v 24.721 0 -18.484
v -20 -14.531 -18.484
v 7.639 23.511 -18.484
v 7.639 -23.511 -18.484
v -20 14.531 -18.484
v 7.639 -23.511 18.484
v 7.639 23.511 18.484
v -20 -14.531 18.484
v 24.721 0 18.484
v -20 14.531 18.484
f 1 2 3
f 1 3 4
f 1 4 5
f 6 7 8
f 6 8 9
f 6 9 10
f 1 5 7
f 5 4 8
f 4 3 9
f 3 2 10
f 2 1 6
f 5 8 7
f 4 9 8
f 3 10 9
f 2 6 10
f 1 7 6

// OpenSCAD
use <../../core/funcs.scad>
use <../../core/placement.scad>
use <../../core/duals.scad>
use <../../core/truncation.scad>
use <../../core/render.scad>
use <../../core/classify.scad>
use <../../core/prisms.scad>
use <../../core/construction.scad>

use <../../models/platonics_all.scad>
use <../../models/archimedians_all.scad>
use <../../models/johnsons_all.scad>

use <edge_seg.scad>
use <face_plate.scad>

SC = 1;
IR = 20 * SC;

//p = (tetrahedron());
//p = poly_truncate(dodecahedron());
//p = (dodecahedron());
//base = icosahedron();
//sol = solve_cantitruncate_trig(base);
//s = poly_cantellate_norm(base, 0.5);
//p = poly_dual(great_rhombicuboctahedron());
//p = poly_truncate(poly_dual(poly_truncate(hexahedron())), t=0, params_overrides=[["vert", "id", [0,1,2,3,4,55], ["t",0.5001]]]);
//p = poly_attach(octahedron(), icosahedron(), f1=[0,7]);
//p = poly_attach(octahedron(), icosahedron(), f1=[0,1,2,3,4,5,6,7]);
//p = poly_attach(p1, icosahedron(), f1=0);

//AP_CANT_ROWS = [
//    ["face", "family", 0, ["df", 0.30]],
//    ["face", "family", 1, ["df", 0.30]]
//];

//p = poly_cantellate(poly_antiprism(6), params_overrides=AP_CANT_ROWS);
//p = poly_prism(5);
//p = poly_antiprism(5);
//p = poly_prism(n=5, p=2);
p = poly_antiprism(n=5, p=2, angle = 0);

//p = j1_square_pyramid();
//p = poly_dual(j2_pentagonal_pyramid());

EDGE_T = 3.5 * SC; // 3.5
FACE_T = 1.6 * SC; // 1.6 * SC;
FIN_T = 1 * SC;
INSET = 1.1 * SC;
FACET_BASE_T = 1;
FACET_BASE_W = 2.2;
BASE_Z = -FACE_T / 4;

//// Or, experimental:
//IR = 12 * SC;
//EDGE_T = 3.0 * SC; // 3.5
//FACE_T = 1.2 * SC; // 1.6 * SC;


/**
* Generate skeletal frame:
    show_faces = undef;

* Generate single face, eg face#8:
    show_faces = [8];
    and place '!'

* Generate multiple faces, eg face#0,#9, and #23:
    show_faces = [0, 9, 23];
    and place '!'
*/
module model(show_faces = undef, clear_airspace = true) {
    let (inter_radius = IR)
    difference() {
        union() {
            // Constructs the edge-based frame
            color("gray")
            place_on_edges(p, IR) {
                edge_seg($ps_edge_pts_local, $ps_poly_center_local, edge_t = EDGE_T);
            }

            // mounting plate - the edge frame isn't quite substantial enough
            color("blue")
            place_on_faces(p, IR) {
                translate([0,0, BASE_Z - FACET_BASE_T]) linear_extrude(FACET_BASE_T)
                    difference() {
                        ps_polygon(points = $ps_face_pts2d);
                        offset(-FACET_BASE_W) ps_polygon(points = $ps_face_pts2d);
                    }
            }
        }
        // Constructs faces, removes them from frame to create face-fitting sockets.
        place_on_faces(p, IR) {
            // add '!' here to force faces-only:
            if (is_undef(show_faces) || len(search($ps_face_idx, [for (i=show_faces) i])) > 0) {
                face_plate($ps_face_idx, $ps_face_pts2d, FACE_T, $ps_face_dihedrals, undef, clear_airspace,
                    edge_inset = INSET, base_z = BASE_Z, clear_height = 0.6);
            }
        }
    }
}

//model();
poly_render(p, 20);
